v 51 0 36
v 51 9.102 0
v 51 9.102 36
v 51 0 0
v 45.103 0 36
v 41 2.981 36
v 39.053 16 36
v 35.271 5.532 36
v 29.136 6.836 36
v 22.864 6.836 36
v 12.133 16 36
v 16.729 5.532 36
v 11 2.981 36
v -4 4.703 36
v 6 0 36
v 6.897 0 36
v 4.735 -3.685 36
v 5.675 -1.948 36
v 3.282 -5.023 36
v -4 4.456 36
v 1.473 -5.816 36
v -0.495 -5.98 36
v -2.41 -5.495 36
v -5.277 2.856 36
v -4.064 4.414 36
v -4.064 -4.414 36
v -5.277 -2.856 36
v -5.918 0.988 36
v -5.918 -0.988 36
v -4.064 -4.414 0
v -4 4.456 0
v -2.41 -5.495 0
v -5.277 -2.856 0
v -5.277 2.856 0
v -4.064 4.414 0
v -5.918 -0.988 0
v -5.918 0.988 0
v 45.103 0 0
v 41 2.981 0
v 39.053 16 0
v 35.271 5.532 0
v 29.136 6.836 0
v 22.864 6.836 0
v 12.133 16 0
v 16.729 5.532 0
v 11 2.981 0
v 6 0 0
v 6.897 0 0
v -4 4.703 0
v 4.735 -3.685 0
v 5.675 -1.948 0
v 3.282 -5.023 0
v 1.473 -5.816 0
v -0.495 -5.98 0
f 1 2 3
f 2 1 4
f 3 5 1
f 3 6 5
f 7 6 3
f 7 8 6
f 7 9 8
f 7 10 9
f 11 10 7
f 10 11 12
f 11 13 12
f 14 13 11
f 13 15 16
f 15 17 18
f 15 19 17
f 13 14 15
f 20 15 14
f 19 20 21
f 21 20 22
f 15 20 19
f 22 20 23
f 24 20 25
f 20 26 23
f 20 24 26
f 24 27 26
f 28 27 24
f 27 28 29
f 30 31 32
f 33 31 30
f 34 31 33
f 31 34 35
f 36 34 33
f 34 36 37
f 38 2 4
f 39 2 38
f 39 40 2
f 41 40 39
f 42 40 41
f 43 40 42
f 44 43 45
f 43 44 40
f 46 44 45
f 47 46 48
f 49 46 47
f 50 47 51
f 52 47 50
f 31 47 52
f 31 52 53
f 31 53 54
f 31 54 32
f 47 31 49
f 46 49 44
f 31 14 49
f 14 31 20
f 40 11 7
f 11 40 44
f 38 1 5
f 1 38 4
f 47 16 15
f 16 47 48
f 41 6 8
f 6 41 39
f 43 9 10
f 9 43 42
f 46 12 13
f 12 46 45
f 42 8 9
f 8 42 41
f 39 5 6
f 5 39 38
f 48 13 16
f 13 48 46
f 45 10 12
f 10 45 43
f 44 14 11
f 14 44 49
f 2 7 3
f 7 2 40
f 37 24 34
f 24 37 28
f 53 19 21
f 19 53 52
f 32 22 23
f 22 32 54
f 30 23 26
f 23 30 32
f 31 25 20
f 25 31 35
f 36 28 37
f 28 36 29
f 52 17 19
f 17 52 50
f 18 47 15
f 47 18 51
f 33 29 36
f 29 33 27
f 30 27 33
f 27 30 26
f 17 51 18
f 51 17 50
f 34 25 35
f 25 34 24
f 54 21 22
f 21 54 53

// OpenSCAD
//PINZAAAAAAAAA///////////////
union(){
difference(){
	union(){
		
	translate([-4,0,0])cube([55,16,36]);
	}

	translate([26,-23,-1])cylinder(r=30, h=38);
	translate([-20,-6.5,-1])rotate([0,0,35])cube([75,21,38]);
	translate([20,27,-1])rotate([0,0,-30])cube([75,21,38]);
	translate([0,0,-1])cylinder(r=1.5, h=38);


}
		cylinder(r=6, h=36);
}
